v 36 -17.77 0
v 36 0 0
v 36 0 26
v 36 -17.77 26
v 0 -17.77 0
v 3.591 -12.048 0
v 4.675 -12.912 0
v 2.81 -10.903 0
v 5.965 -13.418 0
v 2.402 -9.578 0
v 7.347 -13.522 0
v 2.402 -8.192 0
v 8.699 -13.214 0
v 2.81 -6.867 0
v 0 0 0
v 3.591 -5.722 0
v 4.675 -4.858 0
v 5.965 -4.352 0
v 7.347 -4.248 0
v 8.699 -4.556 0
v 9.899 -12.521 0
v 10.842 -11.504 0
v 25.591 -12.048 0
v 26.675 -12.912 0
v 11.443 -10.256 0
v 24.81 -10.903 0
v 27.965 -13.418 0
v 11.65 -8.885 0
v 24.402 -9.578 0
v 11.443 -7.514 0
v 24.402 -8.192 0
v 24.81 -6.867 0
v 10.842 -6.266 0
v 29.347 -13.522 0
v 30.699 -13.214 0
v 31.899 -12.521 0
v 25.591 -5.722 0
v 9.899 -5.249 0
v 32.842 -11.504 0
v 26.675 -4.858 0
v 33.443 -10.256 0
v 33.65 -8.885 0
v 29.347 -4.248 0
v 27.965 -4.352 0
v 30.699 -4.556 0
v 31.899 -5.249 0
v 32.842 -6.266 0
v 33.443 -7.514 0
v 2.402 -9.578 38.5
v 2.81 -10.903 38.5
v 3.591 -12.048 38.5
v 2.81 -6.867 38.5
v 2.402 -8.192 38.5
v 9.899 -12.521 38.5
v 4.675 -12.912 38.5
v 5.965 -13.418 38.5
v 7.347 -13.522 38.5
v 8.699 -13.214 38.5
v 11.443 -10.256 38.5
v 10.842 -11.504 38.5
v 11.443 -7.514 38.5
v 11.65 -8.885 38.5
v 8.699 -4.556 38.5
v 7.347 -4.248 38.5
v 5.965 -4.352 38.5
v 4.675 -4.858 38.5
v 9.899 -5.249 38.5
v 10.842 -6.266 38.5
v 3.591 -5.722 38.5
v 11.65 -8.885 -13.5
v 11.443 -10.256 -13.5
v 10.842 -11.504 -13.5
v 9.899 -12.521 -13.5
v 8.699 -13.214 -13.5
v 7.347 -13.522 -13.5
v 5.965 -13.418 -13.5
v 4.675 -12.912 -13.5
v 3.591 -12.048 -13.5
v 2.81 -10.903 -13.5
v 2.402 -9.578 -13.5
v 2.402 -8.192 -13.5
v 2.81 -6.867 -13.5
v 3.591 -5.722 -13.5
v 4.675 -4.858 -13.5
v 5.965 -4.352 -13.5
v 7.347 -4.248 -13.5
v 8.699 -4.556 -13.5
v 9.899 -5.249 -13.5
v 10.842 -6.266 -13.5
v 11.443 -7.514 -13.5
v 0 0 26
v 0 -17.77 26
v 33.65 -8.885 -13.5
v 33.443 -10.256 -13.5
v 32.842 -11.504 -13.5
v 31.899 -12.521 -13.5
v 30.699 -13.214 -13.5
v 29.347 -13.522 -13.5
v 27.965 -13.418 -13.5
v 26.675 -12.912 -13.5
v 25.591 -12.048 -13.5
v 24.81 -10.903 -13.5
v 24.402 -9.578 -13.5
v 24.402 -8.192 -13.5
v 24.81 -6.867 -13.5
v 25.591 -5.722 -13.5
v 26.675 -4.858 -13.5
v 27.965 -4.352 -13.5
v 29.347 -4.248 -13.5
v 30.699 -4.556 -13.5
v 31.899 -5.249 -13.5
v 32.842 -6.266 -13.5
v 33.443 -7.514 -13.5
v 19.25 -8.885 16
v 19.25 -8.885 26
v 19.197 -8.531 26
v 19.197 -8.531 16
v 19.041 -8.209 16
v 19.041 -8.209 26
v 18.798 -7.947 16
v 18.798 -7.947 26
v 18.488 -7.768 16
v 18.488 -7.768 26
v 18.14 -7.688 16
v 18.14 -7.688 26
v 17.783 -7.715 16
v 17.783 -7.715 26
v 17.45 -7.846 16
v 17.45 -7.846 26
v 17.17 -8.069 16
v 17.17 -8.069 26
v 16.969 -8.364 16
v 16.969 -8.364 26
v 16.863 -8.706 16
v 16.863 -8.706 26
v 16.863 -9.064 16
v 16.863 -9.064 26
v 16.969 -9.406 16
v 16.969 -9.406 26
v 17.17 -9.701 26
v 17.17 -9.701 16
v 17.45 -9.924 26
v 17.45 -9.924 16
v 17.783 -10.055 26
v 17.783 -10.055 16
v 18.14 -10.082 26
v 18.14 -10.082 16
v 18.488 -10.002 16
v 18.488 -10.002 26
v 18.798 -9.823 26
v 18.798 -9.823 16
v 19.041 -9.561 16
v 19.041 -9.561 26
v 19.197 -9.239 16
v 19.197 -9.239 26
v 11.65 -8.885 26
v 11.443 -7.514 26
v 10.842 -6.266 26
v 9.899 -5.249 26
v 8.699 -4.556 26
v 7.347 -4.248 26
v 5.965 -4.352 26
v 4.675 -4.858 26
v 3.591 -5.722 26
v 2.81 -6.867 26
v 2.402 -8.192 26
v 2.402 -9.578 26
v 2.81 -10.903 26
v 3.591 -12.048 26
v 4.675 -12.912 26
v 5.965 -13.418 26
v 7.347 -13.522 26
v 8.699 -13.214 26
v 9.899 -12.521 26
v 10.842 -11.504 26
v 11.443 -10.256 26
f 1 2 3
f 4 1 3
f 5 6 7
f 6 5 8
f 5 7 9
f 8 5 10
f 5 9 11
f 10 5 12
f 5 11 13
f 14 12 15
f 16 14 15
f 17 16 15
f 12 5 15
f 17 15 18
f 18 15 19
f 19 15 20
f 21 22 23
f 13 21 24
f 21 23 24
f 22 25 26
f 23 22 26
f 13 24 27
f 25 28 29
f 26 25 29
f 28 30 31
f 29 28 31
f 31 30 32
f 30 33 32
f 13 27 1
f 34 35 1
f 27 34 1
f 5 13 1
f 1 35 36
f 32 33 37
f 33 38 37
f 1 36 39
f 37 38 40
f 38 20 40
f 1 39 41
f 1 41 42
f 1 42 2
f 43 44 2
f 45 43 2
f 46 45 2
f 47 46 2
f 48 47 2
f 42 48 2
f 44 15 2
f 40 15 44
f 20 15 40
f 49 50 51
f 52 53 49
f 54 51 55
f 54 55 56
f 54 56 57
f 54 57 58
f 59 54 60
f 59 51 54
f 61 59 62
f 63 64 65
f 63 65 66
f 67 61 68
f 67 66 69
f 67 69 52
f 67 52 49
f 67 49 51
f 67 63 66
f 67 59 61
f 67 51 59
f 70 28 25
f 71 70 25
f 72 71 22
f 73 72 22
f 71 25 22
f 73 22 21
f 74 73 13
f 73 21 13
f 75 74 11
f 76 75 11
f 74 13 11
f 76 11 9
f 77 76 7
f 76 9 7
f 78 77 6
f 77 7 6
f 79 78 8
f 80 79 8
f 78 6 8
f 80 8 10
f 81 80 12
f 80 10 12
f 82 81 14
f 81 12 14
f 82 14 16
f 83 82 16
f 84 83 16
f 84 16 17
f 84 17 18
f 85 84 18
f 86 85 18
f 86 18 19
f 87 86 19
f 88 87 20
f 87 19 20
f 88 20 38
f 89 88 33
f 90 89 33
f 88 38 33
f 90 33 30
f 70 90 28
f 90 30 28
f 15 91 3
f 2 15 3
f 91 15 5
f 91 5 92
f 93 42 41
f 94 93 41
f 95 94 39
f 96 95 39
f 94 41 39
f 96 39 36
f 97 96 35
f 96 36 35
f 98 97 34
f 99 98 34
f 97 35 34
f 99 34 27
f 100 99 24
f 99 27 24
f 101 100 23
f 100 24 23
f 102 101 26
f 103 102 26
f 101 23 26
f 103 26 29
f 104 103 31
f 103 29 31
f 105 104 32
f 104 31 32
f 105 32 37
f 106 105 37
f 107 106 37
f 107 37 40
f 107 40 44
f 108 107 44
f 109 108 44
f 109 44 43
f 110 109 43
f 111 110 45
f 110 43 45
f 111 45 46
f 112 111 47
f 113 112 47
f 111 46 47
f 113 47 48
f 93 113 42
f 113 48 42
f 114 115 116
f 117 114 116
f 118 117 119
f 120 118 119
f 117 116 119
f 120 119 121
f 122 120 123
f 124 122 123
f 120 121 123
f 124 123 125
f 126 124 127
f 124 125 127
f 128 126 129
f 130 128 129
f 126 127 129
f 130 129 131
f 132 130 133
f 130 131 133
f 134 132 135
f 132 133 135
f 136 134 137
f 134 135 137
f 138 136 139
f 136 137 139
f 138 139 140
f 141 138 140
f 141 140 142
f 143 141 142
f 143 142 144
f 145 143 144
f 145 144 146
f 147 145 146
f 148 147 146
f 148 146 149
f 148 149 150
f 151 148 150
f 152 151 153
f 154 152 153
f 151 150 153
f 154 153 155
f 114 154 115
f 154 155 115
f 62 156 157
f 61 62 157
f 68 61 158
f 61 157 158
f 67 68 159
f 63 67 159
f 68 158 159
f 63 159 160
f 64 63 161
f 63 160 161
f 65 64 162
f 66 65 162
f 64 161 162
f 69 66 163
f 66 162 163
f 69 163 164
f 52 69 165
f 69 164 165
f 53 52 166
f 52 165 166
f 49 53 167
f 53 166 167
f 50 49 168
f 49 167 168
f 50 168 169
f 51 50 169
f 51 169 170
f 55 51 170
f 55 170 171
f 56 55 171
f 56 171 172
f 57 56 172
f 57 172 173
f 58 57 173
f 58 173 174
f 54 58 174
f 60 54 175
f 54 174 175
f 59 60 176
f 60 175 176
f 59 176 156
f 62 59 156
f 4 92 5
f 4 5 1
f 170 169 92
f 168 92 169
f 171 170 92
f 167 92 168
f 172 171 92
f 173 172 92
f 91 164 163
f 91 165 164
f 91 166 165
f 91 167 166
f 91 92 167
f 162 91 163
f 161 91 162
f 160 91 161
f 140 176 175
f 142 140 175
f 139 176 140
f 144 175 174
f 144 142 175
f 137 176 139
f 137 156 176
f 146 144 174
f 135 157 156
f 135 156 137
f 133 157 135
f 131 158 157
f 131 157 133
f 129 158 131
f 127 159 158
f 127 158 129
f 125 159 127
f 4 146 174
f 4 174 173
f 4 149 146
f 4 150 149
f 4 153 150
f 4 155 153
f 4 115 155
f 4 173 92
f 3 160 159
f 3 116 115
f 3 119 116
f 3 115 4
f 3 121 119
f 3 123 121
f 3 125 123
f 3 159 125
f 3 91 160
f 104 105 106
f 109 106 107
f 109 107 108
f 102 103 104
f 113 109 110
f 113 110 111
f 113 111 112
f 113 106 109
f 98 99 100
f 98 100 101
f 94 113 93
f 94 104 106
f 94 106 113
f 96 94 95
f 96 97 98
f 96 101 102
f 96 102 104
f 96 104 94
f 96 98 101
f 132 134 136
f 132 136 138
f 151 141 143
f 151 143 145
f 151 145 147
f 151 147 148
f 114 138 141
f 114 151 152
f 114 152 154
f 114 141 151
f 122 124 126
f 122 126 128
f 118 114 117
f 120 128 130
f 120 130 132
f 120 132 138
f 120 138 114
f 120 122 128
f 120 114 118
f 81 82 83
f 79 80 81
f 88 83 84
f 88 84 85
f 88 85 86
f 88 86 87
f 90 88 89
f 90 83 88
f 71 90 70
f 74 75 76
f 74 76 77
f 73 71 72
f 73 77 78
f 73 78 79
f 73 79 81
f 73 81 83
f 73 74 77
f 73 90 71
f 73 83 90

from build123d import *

# Parameters (mm, degrees)
F0_W     = 36
F0_H     = 26
F1_DEPTH = 17.77
F2_R     = 4.65
F3_DEPTH = 12.5
F2_R_2   = 1.2
F4_DEPTH = 10
F5_R     = 4.65
F6_DEPTH = 13.5


with BuildPart() as f1:
    # F0 (on Front) → F1 (new body)
    with BuildSketch(Plane.XZ):
        with Locations((18, 13)):
            Rectangle(F0_W, F0_H)
    extrude(amount=F1_DEPTH)

    # F2 (on face) → F3 (join)
    with BuildSketch(Plane.XY.offset(26)):
        with Locations((7, -8.885)):
            Circle(F2_R)
    extrude(amount=F3_DEPTH)

    # F2 (on face) → F4 (cut)
    with BuildSketch(Plane.XY.offset(26)):
        with Locations((18.05, -8.885)):
            Circle(F2_R_2)
    extrude(amount=-F4_DEPTH, mode=Mode.SUBTRACT)

    # F5 (on face) → F6 (join)
    with BuildSketch(Plane(origin=(0, 0, 0), x_dir=(1, 0, 0), z_dir=(0, 0, -1))):
        with Locations((7, 8.885)):
            Circle(F5_R)
        with Locations((29, 8.885)):
            Circle(F5_R)
    extrude(amount=F6_DEPTH)


solid = f1.part
